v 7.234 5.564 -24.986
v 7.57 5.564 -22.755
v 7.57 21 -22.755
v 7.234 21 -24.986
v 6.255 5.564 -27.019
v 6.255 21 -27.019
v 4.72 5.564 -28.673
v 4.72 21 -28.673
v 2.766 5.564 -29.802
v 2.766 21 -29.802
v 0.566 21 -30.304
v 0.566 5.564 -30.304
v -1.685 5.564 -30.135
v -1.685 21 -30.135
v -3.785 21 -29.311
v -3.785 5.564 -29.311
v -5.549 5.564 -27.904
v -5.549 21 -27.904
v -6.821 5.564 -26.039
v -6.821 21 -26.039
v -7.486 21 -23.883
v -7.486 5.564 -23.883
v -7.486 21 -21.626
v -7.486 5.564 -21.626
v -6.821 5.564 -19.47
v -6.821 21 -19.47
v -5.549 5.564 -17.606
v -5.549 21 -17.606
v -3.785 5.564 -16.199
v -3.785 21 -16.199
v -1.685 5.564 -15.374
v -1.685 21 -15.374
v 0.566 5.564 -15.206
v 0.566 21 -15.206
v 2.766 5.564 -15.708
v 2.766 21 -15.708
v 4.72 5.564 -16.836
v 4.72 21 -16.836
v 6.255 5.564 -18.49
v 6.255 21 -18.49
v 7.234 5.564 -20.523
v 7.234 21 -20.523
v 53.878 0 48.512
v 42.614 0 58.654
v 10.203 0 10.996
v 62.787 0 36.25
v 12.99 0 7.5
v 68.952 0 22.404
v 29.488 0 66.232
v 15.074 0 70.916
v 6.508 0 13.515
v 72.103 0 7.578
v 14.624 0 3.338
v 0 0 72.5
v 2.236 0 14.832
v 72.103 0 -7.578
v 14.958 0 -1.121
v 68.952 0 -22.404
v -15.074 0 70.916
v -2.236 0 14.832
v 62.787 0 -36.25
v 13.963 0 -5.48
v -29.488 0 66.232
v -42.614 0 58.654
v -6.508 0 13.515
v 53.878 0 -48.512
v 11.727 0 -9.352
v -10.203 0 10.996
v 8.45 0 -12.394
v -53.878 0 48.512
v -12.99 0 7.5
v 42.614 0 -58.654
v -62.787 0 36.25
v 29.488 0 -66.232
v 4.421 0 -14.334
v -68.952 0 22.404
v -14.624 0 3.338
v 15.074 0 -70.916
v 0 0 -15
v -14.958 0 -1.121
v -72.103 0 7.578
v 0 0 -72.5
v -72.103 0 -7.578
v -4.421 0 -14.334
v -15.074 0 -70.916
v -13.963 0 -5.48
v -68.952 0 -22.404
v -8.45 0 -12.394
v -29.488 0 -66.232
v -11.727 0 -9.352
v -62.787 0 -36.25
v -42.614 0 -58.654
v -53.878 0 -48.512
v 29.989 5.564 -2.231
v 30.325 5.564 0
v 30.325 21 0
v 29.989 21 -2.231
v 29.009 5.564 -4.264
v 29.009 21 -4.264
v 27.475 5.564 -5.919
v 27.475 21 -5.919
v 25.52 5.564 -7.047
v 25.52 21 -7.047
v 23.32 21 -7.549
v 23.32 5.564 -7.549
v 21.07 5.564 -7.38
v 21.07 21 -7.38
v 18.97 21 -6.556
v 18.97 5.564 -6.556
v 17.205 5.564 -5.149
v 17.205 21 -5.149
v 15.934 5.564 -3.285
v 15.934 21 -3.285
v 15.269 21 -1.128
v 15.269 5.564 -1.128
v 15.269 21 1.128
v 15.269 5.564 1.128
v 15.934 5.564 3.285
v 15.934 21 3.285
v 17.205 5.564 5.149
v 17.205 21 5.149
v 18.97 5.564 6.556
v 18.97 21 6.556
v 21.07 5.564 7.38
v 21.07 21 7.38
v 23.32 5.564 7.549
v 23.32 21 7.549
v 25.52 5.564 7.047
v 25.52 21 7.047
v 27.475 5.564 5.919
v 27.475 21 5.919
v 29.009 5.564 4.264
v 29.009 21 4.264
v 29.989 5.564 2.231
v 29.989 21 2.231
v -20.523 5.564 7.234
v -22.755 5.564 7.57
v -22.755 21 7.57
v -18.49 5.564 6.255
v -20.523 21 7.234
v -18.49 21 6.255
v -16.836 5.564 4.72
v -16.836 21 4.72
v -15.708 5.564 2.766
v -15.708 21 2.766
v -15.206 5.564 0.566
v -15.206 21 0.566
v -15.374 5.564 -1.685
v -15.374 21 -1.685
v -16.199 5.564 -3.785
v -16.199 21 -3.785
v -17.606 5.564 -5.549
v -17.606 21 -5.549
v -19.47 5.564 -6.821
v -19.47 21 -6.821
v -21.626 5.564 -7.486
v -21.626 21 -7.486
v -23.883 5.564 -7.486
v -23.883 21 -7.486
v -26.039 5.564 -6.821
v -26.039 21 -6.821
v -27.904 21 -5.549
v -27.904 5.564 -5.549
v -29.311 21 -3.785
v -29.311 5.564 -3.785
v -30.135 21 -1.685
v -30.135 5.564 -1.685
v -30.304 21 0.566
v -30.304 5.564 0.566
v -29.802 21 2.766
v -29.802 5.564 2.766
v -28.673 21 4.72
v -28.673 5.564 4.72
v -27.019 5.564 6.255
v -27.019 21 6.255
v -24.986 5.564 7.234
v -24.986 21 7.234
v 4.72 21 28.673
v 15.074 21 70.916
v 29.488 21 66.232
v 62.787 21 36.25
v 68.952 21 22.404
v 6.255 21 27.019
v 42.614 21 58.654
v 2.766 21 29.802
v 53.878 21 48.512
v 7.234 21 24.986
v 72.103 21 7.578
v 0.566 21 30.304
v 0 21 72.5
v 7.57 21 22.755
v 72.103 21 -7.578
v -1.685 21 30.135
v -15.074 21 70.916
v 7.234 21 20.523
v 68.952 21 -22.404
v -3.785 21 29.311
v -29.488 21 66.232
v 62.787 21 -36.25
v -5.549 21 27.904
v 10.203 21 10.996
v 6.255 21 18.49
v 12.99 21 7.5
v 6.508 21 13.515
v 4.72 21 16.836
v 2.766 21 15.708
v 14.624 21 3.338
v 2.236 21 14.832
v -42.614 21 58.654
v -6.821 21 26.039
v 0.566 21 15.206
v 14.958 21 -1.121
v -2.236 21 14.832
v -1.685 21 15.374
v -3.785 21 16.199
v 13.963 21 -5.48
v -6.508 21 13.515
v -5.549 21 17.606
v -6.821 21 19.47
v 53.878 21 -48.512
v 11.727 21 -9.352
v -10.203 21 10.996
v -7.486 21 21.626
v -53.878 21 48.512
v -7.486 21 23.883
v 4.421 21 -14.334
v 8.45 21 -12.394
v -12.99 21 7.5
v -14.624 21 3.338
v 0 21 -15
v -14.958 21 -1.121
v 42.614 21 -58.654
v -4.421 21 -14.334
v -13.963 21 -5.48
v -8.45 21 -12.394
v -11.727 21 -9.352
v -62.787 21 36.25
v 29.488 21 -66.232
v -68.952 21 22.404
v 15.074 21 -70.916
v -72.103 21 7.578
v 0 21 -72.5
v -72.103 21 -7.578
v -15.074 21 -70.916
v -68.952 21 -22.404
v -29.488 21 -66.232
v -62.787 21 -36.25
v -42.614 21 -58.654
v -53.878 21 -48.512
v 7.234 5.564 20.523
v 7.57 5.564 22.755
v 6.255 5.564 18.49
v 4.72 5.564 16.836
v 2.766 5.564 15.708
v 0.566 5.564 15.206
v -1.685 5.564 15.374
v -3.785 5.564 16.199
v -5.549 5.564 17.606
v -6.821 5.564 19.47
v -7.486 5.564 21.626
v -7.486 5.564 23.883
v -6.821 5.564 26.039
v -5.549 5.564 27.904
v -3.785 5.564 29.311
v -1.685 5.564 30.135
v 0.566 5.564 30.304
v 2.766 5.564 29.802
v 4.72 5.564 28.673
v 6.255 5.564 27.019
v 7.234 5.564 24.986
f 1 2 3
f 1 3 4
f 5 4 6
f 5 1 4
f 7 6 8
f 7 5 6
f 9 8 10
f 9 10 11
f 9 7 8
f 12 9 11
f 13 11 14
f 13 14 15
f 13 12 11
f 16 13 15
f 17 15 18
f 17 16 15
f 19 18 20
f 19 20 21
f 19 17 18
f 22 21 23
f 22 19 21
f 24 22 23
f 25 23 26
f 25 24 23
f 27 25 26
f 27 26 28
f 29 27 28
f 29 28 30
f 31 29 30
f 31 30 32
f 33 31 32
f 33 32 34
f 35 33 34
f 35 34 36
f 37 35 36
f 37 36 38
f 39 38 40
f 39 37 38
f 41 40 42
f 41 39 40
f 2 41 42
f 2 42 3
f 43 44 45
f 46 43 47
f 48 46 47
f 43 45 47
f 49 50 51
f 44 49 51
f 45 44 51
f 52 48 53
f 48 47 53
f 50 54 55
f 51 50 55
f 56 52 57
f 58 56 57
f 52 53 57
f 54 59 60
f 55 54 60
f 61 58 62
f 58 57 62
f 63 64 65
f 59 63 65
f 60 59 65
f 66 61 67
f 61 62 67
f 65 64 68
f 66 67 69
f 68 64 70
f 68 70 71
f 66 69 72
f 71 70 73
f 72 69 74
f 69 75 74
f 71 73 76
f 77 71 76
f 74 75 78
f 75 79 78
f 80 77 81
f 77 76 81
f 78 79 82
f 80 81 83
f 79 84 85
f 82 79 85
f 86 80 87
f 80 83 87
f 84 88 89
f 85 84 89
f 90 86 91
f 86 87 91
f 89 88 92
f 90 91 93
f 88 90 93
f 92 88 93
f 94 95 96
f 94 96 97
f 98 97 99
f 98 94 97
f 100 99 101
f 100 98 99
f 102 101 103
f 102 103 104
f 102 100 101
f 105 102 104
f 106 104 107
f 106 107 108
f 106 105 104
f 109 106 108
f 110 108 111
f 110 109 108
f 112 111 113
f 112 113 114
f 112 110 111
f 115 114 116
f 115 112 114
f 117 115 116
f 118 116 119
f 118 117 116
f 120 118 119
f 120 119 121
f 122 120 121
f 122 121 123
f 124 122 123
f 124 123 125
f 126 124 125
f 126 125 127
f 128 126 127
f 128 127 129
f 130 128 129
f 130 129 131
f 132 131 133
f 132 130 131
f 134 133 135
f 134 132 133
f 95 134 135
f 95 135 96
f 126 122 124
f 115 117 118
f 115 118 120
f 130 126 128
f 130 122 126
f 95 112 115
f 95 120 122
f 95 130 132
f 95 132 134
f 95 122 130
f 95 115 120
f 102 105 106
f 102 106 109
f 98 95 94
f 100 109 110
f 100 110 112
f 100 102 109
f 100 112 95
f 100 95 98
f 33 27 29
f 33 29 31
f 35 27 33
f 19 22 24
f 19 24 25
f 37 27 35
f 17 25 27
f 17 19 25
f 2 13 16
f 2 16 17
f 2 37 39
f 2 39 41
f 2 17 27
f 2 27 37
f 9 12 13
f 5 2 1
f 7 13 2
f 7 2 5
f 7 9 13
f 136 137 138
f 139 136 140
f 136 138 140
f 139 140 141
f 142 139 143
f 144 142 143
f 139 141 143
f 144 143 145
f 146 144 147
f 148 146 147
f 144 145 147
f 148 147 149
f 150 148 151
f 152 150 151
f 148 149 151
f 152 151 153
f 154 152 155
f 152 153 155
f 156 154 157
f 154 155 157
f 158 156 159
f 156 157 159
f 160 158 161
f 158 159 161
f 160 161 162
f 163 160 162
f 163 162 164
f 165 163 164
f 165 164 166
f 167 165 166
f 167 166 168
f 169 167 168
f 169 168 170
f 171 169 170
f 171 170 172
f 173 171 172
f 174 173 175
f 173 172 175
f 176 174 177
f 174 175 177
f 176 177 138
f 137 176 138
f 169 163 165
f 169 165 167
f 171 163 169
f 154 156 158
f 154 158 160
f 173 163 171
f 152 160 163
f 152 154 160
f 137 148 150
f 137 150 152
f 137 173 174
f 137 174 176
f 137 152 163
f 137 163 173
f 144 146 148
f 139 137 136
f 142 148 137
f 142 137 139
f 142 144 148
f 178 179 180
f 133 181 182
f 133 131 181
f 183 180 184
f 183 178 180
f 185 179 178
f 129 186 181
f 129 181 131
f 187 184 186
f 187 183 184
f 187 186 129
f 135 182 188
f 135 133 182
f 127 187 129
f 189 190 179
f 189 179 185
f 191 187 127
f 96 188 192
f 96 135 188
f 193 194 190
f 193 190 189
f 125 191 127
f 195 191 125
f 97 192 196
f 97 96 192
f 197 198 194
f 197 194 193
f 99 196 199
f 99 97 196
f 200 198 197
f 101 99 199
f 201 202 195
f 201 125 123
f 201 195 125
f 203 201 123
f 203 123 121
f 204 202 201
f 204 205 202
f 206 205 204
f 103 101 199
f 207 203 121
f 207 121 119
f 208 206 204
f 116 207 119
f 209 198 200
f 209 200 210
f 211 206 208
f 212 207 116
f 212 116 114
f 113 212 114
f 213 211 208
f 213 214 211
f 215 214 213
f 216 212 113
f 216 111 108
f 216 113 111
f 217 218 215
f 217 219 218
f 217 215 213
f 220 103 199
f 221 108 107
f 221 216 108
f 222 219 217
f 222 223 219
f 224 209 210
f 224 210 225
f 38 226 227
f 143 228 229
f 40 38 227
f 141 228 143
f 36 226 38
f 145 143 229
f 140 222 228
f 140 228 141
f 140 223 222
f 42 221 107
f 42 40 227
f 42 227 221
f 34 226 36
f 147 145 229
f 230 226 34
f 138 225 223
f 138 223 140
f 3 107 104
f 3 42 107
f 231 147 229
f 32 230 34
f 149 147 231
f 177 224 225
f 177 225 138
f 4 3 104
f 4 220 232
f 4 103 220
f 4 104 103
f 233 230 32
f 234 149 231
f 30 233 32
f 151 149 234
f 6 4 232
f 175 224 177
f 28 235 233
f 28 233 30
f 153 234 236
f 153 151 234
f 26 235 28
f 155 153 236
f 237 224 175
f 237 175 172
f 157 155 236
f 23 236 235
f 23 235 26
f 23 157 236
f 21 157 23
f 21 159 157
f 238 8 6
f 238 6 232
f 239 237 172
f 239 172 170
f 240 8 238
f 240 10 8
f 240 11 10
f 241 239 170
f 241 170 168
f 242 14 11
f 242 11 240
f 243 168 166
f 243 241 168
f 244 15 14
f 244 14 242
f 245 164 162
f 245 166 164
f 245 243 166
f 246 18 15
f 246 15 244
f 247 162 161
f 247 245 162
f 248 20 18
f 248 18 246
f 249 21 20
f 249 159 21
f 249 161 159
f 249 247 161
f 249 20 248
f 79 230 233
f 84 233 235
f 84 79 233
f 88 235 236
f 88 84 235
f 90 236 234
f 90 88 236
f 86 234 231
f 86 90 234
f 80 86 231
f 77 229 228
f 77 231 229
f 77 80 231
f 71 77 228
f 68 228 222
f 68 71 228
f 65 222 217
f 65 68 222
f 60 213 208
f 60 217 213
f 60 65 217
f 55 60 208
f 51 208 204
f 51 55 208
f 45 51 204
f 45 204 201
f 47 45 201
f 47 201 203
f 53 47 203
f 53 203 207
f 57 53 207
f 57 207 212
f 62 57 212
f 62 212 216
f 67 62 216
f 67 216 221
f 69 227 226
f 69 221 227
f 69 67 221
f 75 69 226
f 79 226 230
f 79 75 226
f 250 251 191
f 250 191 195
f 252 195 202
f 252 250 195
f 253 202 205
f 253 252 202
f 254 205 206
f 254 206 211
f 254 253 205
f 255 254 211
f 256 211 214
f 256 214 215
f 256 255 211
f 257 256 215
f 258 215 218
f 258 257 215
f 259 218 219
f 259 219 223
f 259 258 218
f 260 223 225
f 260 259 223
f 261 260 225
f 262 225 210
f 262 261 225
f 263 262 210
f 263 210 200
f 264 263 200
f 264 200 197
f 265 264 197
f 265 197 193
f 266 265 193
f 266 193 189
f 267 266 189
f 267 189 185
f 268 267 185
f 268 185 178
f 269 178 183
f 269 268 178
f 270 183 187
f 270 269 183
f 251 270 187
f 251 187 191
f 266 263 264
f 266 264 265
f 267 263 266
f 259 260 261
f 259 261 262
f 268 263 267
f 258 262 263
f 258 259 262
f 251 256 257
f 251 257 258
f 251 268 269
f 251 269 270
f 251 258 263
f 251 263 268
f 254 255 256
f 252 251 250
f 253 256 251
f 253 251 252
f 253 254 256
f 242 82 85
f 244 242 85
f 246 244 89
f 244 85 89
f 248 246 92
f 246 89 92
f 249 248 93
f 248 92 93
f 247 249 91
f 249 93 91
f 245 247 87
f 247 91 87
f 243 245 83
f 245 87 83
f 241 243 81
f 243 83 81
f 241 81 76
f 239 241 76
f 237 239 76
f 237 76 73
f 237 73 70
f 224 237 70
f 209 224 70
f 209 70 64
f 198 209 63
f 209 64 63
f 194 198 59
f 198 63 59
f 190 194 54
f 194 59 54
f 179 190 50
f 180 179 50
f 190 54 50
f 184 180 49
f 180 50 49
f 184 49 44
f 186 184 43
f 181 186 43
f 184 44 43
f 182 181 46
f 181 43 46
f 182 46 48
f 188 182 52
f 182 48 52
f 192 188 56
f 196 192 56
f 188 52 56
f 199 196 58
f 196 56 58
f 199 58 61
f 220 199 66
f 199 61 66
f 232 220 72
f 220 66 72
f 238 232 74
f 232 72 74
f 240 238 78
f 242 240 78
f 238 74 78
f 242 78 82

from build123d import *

# Parameters (mm, degrees)
SKETCH1_R           = 72.5
BOSS_EXTRUDE1_DEPTH = 21
SKETCH2_R           = 15
CUT_EXTRUDE1_DEPTH  = 105.658969993
SKETCH3_R           = 7.570186168
CUT_EXTRUDE2_DEPTH  = 15.436386101
CIRPATTERN1_COUNT   = 4


with BuildPart() as part:
    # Sketch1 → Boss-Extrude1 (new body)
    with BuildSketch(Plane(origin=(0, 0, 0), x_dir=(1, 0, 0), z_dir=(0, 1, 0))):
        Circle(SKETCH1_R)
    extrude(amount=BOSS_EXTRUDE1_DEPTH)

    # Sketch2 → Cut-Extrude1 (cut, through all)
    with BuildSketch(Plane(origin=(0, 0, 0), x_dir=(1, 0, 0), z_dir=(0, 1, 0))):
        Circle(SKETCH2_R)
    extrude(amount=CUT_EXTRUDE1_DEPTH, mode=Mode.SUBTRACT)

    # Sketch3 → Cut-Extrude2 (cut)
    with BuildSketch(Plane(origin=(0, 21, 0), x_dir=(1, 0, 0), z_dir=(0, 1, 0))):
        with Locations((-22.754654532, 0)):
            Circle(SKETCH3_R)
    cut_extrude2 = extrude(amount=-CUT_EXTRUDE2_DEPTH, mode=Mode.SUBTRACT)

    # CirPattern1: Cut-Extrude2 ×4 about axis
    cirpattern1_axis = Axis((0, 0, 0), (0, 1, 0))
    for i in range(1, CIRPATTERN1_COUNT):
        add(cut_extrude2.rotate(cirpattern1_axis, i * 360 / CIRPATTERN1_COUNT), mode=Mode.SUBTRACT)


solid = part.part
